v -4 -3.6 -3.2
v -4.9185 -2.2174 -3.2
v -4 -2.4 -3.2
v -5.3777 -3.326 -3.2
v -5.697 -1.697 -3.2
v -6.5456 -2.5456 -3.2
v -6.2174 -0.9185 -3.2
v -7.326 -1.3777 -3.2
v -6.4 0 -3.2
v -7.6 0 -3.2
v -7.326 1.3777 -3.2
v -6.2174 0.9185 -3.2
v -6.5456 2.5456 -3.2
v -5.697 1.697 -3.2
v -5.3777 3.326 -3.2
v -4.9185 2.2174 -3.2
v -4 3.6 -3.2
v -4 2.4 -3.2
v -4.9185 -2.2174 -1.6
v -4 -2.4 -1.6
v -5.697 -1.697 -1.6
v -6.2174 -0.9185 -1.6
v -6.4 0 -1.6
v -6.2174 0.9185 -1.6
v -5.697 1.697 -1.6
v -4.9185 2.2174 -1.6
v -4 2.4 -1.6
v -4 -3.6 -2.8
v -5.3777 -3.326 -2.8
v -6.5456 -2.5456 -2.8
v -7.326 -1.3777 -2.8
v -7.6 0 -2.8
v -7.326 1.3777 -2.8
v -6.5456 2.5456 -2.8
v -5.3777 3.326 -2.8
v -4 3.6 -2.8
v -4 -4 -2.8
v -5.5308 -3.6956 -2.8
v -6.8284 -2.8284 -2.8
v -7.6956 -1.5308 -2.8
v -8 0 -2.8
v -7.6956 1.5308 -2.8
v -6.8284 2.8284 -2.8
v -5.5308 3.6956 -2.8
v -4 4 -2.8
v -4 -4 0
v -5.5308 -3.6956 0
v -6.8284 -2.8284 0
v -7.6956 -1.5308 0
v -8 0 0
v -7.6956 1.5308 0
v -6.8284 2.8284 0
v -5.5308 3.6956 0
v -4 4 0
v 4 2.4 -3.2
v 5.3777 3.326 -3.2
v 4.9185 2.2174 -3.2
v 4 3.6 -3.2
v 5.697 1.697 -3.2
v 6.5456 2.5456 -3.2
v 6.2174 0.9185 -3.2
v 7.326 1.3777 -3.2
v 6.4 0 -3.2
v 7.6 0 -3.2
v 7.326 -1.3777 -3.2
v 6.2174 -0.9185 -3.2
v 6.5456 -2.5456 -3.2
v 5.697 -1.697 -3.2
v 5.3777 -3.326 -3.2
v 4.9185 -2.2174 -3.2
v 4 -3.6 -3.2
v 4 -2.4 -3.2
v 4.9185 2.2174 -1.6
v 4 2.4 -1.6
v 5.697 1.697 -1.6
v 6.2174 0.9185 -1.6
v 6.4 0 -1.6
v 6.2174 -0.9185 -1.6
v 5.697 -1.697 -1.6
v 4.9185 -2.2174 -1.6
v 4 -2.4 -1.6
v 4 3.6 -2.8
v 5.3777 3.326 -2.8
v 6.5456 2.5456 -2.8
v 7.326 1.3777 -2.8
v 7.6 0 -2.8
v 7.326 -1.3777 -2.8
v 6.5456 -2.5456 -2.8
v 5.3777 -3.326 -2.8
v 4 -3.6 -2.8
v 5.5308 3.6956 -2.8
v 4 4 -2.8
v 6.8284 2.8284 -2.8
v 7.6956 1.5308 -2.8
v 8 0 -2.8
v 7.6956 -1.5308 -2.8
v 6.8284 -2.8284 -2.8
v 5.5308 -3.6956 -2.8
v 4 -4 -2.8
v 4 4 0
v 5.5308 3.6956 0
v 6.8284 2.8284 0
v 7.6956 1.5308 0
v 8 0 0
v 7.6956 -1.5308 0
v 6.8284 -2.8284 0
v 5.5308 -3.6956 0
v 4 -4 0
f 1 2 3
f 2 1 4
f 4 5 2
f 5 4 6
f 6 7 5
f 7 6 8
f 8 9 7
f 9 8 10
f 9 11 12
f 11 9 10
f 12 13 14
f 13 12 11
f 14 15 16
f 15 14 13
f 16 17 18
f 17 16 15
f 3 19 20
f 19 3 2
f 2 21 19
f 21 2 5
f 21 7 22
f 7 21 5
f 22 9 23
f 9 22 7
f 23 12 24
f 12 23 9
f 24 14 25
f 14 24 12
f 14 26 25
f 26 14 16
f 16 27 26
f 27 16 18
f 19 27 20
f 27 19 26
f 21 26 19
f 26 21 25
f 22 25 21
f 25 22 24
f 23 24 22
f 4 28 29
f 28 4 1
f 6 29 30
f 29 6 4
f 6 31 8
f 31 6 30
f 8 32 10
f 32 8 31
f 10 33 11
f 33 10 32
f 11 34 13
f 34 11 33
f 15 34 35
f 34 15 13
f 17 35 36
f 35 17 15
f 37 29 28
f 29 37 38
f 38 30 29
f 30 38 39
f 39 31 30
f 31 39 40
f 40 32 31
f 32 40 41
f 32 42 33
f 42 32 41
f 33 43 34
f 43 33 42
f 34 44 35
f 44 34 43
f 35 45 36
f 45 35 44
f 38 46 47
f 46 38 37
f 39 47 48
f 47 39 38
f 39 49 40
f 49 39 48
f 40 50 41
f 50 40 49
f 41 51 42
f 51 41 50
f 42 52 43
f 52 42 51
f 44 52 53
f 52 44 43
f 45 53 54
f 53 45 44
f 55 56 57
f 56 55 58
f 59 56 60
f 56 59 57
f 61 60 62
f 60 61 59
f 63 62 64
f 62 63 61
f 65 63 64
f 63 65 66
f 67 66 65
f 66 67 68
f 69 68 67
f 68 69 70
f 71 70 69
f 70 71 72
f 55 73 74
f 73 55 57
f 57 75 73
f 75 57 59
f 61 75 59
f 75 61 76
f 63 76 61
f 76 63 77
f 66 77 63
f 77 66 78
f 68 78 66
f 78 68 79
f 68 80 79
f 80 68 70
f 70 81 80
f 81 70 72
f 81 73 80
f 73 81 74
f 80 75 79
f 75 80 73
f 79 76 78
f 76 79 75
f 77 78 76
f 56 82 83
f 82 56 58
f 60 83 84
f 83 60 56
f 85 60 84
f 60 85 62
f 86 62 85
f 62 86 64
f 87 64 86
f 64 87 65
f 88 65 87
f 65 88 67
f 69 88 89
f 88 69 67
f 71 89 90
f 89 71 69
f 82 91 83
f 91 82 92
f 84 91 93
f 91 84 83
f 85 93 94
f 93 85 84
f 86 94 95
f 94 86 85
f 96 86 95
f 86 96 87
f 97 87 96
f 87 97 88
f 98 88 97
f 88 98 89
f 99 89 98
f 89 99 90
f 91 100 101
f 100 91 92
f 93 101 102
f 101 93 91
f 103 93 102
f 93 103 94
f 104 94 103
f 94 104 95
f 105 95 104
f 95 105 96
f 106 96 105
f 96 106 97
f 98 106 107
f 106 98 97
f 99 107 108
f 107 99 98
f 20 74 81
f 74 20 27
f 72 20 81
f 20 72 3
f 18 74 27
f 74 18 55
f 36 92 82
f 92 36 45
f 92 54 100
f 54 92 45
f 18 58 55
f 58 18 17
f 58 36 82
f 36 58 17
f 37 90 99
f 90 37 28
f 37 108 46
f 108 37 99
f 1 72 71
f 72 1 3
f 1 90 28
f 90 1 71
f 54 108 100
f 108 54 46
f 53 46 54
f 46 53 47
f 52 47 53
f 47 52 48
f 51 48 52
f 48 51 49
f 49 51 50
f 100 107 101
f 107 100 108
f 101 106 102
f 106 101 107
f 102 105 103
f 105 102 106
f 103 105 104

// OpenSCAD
use <../lib.scad>
use <../p/2-4chrd.scad>
use <s/1126s01.scad>
$fa=1; $fs=0.2;
function ldraw_lib__1126(realsolid=false) = [
// 0 Tile  1 x  2 with Rounded Ends
// 0 Name: 1126.dat
// 0 Author: Magnus Forsberg [MagFors]
// 0 !LDRAW_ORG Part UPDATE 2022-06
// 0 !LICENSE Licensed under CC BY 2.0 and CC BY 4.0 : see CAreadme.txt
// 
// 0 BFC CERTIFY CCW
  [0,"BFC","CERTIFY"],
  [0,"BFC","CCW"],
// 
// 0 !HISTORY 2022-12-20 [PTadmin] Official Update 2022-06
// 
// 
// 1 16 0 0 0 1 0 0 0 1 0 0 0 1 s\1126s01.dat
  [1,16,0,0,0,1,0,0,0,1,0,0,0,1, ldraw_lib__s__1126s01(realsolid)],
// 4 16 -10 0 10 -10 0 -10 10 0 -10 10 0 10
  [4,16,-10,0,10,-10,0,-10,10,0,-10,10,0,10],
// 1 16 -10 0 0 0 0 -10 0 1 0 -10 0 0 2-4chrd.dat
  [1,16,-10,0,0,0,0,-10,0,1,0,-10,0,0, ldraw_lib__2_4chrd(realsolid)],
// 1 16 10 0 0 0 0 10 0 1 0 10 0 0 2-4chrd.dat
  [1,16,10,0,0,0,0,10,0,1,0,10,0,0, ldraw_lib__2_4chrd(realsolid)],
];
module ldraw_lib__1126(step=0, col=false, unit=2/5, alt=false, line=0.2, solid=!$preview)
    makepoly(ldraw_lib__1126(solid), step=step, col=col, unit=unit, alt=alt, line=line, solid=solid);
ldraw_lib__1126(line=0.2);
